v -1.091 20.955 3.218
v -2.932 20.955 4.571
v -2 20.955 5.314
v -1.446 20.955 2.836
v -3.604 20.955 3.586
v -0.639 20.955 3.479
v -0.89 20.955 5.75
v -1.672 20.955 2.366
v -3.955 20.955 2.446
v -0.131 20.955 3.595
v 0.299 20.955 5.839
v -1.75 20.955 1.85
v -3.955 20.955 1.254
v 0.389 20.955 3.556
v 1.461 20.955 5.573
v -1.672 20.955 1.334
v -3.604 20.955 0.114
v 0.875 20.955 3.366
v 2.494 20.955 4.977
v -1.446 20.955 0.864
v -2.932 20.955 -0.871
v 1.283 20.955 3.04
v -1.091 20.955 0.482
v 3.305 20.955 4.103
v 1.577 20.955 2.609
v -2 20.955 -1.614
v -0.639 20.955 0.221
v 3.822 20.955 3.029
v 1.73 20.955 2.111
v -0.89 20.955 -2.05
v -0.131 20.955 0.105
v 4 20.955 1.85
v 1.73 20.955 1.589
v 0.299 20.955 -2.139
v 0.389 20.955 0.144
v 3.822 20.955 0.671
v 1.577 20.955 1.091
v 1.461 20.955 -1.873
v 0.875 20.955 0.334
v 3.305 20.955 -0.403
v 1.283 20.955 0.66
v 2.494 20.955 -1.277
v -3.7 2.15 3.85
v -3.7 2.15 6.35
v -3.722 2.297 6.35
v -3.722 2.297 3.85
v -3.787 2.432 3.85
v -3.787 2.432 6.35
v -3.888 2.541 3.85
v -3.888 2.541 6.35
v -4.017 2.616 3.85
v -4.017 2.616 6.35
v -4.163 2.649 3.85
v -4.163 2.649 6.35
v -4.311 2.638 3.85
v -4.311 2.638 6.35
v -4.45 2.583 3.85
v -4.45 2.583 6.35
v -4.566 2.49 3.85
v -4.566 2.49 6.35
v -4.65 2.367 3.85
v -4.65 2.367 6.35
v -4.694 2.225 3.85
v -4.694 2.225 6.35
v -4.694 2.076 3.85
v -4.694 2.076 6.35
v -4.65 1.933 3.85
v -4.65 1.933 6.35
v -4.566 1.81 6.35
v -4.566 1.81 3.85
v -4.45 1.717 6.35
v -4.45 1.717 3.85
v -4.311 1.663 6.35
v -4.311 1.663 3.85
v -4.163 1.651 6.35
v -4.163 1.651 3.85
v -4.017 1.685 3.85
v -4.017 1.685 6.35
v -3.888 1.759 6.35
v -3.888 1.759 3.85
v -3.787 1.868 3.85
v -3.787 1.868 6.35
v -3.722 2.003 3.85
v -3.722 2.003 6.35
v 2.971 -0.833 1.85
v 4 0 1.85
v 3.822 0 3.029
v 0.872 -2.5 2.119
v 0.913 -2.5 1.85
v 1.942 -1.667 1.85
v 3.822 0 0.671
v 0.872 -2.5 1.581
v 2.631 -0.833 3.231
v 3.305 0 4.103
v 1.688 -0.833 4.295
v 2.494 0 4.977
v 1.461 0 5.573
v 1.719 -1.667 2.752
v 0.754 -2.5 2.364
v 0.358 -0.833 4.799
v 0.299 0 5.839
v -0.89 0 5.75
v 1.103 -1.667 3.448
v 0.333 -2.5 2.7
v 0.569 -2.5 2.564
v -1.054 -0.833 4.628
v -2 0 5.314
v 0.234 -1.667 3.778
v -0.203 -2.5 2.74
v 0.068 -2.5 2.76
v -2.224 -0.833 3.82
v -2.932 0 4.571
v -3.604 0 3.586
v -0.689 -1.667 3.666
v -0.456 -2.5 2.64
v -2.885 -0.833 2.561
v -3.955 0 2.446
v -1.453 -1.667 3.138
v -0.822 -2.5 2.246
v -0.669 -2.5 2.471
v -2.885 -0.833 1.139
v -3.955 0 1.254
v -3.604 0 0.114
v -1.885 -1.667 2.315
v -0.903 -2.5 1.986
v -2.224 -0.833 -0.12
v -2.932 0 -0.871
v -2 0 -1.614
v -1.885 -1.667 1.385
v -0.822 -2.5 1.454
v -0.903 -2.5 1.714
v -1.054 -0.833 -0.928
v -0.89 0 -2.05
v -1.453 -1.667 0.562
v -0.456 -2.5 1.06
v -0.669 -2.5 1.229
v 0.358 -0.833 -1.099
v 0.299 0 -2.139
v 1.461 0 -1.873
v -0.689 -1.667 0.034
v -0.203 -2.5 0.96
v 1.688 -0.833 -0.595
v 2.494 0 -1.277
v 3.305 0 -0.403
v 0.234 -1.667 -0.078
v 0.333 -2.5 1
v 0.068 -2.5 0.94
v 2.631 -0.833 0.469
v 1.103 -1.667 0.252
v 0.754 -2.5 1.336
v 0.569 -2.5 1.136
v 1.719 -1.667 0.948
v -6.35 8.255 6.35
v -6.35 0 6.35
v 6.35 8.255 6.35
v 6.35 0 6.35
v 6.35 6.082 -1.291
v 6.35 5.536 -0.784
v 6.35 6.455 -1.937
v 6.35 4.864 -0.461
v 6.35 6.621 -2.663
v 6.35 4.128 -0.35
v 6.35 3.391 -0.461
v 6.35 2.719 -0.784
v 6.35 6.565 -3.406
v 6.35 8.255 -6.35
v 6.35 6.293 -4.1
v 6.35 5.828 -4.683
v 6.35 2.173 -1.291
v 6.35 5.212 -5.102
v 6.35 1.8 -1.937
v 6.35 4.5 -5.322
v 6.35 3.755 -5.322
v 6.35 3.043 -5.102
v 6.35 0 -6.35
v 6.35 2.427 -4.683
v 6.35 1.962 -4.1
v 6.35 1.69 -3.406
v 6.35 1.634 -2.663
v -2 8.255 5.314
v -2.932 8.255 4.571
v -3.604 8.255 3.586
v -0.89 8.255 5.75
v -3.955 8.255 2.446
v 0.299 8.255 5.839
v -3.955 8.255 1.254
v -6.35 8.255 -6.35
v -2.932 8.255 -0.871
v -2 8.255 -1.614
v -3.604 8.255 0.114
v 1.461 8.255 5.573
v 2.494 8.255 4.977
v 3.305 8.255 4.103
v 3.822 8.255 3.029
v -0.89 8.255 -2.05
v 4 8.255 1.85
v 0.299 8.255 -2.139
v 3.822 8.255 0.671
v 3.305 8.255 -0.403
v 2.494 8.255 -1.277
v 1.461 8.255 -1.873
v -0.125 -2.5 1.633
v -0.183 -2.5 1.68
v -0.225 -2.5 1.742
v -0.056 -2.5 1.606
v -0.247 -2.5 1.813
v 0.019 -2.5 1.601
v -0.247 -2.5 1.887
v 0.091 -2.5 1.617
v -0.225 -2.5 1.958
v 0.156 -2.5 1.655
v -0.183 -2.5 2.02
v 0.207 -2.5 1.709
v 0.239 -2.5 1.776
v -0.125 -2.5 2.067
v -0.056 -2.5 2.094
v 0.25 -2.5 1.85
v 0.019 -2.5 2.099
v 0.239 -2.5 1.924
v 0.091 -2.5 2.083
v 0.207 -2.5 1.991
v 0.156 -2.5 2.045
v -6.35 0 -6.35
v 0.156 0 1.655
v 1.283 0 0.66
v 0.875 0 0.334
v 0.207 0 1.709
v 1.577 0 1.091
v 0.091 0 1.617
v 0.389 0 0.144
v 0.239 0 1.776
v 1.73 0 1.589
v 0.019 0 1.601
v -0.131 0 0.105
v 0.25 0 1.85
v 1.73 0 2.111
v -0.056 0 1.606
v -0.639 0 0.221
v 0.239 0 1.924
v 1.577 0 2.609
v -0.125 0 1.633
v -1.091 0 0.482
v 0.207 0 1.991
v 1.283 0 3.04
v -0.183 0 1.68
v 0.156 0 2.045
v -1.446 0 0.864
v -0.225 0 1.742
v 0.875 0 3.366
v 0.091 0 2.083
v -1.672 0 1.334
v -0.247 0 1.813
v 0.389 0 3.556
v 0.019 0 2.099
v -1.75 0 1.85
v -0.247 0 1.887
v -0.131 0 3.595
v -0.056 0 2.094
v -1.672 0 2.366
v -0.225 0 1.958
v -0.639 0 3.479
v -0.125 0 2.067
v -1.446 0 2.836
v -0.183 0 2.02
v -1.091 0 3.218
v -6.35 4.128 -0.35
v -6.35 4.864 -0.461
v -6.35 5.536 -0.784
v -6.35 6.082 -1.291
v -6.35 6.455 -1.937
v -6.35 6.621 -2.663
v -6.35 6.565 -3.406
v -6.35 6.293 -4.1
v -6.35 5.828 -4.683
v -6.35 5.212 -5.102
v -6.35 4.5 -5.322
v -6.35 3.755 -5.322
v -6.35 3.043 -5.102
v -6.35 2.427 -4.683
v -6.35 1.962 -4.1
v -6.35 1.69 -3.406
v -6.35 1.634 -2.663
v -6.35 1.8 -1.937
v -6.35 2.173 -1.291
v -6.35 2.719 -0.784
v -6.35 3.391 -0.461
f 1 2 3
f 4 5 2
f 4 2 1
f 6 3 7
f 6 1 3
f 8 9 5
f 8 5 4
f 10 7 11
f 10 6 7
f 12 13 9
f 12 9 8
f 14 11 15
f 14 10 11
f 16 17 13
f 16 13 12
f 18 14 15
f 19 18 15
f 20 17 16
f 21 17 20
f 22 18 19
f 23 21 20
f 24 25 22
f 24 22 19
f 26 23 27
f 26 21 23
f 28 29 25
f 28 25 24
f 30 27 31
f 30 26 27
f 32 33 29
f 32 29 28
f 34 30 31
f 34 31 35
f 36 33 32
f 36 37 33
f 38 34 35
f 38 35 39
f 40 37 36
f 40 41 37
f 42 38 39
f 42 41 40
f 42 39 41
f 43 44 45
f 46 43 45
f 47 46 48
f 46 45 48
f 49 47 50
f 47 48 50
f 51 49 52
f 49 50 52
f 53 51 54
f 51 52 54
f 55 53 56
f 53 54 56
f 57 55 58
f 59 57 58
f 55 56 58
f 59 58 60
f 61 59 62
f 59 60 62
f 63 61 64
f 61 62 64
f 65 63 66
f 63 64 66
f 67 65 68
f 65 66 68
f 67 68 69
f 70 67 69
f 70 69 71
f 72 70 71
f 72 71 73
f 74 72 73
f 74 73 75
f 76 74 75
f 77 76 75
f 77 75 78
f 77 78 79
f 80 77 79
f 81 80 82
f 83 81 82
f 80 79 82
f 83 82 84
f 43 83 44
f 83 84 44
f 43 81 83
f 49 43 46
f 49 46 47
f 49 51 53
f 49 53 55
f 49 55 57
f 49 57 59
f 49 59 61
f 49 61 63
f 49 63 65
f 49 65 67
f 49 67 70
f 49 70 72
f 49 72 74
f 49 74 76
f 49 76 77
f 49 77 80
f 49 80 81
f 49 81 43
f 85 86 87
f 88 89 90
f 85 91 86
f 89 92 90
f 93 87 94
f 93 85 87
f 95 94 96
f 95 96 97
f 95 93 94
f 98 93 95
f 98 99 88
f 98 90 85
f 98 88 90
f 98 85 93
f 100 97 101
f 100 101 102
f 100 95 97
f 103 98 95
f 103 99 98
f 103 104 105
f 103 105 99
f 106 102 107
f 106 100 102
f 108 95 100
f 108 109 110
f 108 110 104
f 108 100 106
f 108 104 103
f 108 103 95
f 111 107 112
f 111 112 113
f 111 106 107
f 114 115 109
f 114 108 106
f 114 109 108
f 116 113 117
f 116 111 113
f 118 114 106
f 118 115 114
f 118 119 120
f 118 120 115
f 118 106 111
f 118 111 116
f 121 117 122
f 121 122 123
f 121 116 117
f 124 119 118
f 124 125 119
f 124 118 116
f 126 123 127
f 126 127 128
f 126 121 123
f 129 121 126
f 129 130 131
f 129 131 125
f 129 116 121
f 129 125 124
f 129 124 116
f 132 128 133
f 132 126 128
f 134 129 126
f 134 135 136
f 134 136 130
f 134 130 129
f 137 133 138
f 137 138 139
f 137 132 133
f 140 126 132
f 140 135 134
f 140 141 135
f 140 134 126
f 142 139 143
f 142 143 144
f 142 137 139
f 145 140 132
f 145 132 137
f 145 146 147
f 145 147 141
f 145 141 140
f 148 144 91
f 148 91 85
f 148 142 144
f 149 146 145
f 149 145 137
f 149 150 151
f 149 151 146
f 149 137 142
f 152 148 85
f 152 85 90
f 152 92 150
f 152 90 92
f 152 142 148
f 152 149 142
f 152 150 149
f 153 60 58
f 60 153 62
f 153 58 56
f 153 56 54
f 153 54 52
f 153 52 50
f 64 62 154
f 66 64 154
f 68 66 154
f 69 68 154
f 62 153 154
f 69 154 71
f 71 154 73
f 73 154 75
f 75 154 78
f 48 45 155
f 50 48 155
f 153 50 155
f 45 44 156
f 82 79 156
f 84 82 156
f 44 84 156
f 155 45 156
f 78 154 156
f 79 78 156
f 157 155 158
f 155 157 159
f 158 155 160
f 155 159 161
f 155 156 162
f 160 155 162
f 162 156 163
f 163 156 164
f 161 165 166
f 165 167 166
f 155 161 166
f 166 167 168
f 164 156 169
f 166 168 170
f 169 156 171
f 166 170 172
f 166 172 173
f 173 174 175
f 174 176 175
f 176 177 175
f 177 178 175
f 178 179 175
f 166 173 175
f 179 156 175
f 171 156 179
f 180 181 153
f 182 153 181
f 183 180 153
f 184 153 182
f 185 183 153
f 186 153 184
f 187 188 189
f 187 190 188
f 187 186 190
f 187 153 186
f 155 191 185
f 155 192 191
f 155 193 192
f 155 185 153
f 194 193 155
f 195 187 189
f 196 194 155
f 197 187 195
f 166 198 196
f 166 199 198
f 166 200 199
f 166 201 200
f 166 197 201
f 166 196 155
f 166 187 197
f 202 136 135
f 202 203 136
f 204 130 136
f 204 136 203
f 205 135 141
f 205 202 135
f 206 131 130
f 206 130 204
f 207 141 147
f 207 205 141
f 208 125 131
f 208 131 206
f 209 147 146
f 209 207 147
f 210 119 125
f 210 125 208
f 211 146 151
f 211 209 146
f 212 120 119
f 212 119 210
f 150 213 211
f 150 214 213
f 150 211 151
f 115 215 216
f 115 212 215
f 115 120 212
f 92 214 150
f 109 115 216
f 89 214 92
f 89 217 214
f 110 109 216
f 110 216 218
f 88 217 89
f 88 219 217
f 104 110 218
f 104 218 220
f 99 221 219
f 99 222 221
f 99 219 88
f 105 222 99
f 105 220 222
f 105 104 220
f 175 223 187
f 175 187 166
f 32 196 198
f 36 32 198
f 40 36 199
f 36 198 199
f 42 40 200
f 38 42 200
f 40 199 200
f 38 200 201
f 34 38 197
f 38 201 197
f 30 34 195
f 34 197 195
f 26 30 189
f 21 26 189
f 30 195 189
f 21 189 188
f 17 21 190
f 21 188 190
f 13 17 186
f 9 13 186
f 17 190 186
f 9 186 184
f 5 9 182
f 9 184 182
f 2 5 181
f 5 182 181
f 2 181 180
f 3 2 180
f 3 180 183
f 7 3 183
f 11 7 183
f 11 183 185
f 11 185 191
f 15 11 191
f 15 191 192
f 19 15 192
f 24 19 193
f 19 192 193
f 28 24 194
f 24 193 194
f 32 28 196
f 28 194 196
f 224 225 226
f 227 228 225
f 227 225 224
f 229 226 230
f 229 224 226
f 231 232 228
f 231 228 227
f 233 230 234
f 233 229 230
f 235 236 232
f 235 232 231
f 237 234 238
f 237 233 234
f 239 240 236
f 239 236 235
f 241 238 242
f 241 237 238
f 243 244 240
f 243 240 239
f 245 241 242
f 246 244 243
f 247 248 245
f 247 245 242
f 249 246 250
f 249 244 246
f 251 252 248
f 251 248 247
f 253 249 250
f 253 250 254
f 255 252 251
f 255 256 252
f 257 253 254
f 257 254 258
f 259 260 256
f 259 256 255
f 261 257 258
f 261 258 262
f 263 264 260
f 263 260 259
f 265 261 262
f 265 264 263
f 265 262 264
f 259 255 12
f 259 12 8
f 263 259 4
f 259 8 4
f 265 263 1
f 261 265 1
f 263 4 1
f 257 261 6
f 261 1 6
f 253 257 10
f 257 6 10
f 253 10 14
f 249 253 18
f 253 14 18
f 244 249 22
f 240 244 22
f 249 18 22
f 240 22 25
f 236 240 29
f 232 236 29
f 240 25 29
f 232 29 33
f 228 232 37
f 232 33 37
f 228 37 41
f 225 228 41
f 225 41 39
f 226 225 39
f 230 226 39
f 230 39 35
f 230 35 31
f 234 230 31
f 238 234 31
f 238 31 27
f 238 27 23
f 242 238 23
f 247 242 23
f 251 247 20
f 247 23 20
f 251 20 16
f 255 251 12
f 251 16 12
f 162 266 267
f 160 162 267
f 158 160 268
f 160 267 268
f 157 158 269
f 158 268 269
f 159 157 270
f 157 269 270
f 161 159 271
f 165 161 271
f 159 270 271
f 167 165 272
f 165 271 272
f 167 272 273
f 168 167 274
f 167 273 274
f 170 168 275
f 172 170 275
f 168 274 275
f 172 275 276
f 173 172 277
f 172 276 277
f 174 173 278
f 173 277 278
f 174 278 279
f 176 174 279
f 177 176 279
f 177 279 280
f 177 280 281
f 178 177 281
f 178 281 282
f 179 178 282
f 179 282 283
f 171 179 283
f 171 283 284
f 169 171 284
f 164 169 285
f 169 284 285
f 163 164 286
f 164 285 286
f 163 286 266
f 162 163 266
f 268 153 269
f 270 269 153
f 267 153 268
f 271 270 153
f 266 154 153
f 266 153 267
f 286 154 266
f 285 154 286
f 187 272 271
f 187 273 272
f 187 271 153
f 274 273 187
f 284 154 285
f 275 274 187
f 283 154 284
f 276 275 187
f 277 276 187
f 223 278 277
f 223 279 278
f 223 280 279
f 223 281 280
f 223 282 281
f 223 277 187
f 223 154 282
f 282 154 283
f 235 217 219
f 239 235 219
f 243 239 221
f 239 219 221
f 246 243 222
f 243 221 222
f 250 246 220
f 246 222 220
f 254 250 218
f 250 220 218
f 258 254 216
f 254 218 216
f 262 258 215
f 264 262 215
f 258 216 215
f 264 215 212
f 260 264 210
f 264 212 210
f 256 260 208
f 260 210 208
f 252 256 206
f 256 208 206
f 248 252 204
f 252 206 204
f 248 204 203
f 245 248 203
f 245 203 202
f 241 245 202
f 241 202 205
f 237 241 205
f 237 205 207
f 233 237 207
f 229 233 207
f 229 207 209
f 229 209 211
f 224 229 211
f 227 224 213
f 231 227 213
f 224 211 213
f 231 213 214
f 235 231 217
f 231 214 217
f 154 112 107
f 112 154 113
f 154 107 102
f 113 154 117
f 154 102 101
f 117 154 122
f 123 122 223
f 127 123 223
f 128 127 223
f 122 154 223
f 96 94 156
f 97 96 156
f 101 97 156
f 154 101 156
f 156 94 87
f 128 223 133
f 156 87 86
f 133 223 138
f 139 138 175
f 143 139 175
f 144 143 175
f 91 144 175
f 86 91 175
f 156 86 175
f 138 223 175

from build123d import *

# Parameters (mm, degrees)
SKETCH1_W       = 12.7
SKETCH1_H       = 12.7
EXTRUDE1_DEPTH  = 8.255
SKETCH2_R       = 4
EXTRUDE2_DEPTH  = 12.7
SKETCH4_R       = 4
EXTRUDE8_DEPTH  = 2.5
EXTRUDE8_TAPER  = 51
SKETCH5_R       = 0.25
EXTRUDE9_DEPTH  = 2.5
SKETCH3_R       = 1.75
EXTRUDE10_DEPTH = 20.955
SKETCH7_R       = 2.5
EXTRUDE11_DEPTH = 12.7
SKETCH8_R       = 0.5
EXTRUDE12_DEPTH = 2.5


with BuildPart() as part:
    # Sketch1 → Extrude1 (new body)
    with BuildSketch(Plane(origin=(0, 0, 0), x_dir=(1, 0, 0), z_dir=(0, 1, 0))):
        Rectangle(SKETCH1_W, SKETCH1_H)
    extrude(amount=EXTRUDE1_DEPTH)

    # Sketch2 → Extrude2 (add)
    with BuildSketch(Plane(origin=(0, 8.255, 0), x_dir=(1, 0, 0), z_dir=(0, 1, 0))):
        with Locations((0, -1.85)):
            Circle(SKETCH2_R)
    extrude(amount=EXTRUDE2_DEPTH)

    # Sketch4 → Extrude8 (add)
    with BuildSketch(Plane.XZ):
        with Locations((0, 1.85)):
            Circle(SKETCH4_R)
    extrude(amount=EXTRUDE8_DEPTH, taper=EXTRUDE8_TAPER)

    # Sketch5 → Extrude9 (cut)
    with BuildSketch(Plane.XZ.offset(2.5)):
        with Locations((0, 1.85)):
            Circle(SKETCH5_R)
    extrude(amount=-EXTRUDE9_DEPTH, mode=Mode.SUBTRACT)

    # Sketch3 → Extrude10 (cut)
    with BuildSketch(Plane(origin=(0, 20.955, 0), x_dir=(-1, 0, 0), z_dir=(0, 1, 0))):
        with Locations((0, 1.85)):
            Circle(SKETCH3_R)
    extrude(amount=-EXTRUDE10_DEPTH, mode=Mode.SUBTRACT)

    # Sketch7 → Extrude11 (cut)
    with BuildSketch(Plane.ZY.offset(6.35)):
        with Locations((-2.85, 4.1275)):
            Circle(SKETCH7_R)
    extrude(amount=-EXTRUDE11_DEPTH, mode=Mode.SUBTRACT)

    # Sketch8 → Extrude12 (cut)
    with BuildSketch(Plane.XY.offset(6.35)):
        with Locations((-4.199914645, 2.150085355)):
            Circle(SKETCH8_R)
    extrude(amount=-EXTRUDE12_DEPTH, mode=Mode.SUBTRACT)


solid = part.part
